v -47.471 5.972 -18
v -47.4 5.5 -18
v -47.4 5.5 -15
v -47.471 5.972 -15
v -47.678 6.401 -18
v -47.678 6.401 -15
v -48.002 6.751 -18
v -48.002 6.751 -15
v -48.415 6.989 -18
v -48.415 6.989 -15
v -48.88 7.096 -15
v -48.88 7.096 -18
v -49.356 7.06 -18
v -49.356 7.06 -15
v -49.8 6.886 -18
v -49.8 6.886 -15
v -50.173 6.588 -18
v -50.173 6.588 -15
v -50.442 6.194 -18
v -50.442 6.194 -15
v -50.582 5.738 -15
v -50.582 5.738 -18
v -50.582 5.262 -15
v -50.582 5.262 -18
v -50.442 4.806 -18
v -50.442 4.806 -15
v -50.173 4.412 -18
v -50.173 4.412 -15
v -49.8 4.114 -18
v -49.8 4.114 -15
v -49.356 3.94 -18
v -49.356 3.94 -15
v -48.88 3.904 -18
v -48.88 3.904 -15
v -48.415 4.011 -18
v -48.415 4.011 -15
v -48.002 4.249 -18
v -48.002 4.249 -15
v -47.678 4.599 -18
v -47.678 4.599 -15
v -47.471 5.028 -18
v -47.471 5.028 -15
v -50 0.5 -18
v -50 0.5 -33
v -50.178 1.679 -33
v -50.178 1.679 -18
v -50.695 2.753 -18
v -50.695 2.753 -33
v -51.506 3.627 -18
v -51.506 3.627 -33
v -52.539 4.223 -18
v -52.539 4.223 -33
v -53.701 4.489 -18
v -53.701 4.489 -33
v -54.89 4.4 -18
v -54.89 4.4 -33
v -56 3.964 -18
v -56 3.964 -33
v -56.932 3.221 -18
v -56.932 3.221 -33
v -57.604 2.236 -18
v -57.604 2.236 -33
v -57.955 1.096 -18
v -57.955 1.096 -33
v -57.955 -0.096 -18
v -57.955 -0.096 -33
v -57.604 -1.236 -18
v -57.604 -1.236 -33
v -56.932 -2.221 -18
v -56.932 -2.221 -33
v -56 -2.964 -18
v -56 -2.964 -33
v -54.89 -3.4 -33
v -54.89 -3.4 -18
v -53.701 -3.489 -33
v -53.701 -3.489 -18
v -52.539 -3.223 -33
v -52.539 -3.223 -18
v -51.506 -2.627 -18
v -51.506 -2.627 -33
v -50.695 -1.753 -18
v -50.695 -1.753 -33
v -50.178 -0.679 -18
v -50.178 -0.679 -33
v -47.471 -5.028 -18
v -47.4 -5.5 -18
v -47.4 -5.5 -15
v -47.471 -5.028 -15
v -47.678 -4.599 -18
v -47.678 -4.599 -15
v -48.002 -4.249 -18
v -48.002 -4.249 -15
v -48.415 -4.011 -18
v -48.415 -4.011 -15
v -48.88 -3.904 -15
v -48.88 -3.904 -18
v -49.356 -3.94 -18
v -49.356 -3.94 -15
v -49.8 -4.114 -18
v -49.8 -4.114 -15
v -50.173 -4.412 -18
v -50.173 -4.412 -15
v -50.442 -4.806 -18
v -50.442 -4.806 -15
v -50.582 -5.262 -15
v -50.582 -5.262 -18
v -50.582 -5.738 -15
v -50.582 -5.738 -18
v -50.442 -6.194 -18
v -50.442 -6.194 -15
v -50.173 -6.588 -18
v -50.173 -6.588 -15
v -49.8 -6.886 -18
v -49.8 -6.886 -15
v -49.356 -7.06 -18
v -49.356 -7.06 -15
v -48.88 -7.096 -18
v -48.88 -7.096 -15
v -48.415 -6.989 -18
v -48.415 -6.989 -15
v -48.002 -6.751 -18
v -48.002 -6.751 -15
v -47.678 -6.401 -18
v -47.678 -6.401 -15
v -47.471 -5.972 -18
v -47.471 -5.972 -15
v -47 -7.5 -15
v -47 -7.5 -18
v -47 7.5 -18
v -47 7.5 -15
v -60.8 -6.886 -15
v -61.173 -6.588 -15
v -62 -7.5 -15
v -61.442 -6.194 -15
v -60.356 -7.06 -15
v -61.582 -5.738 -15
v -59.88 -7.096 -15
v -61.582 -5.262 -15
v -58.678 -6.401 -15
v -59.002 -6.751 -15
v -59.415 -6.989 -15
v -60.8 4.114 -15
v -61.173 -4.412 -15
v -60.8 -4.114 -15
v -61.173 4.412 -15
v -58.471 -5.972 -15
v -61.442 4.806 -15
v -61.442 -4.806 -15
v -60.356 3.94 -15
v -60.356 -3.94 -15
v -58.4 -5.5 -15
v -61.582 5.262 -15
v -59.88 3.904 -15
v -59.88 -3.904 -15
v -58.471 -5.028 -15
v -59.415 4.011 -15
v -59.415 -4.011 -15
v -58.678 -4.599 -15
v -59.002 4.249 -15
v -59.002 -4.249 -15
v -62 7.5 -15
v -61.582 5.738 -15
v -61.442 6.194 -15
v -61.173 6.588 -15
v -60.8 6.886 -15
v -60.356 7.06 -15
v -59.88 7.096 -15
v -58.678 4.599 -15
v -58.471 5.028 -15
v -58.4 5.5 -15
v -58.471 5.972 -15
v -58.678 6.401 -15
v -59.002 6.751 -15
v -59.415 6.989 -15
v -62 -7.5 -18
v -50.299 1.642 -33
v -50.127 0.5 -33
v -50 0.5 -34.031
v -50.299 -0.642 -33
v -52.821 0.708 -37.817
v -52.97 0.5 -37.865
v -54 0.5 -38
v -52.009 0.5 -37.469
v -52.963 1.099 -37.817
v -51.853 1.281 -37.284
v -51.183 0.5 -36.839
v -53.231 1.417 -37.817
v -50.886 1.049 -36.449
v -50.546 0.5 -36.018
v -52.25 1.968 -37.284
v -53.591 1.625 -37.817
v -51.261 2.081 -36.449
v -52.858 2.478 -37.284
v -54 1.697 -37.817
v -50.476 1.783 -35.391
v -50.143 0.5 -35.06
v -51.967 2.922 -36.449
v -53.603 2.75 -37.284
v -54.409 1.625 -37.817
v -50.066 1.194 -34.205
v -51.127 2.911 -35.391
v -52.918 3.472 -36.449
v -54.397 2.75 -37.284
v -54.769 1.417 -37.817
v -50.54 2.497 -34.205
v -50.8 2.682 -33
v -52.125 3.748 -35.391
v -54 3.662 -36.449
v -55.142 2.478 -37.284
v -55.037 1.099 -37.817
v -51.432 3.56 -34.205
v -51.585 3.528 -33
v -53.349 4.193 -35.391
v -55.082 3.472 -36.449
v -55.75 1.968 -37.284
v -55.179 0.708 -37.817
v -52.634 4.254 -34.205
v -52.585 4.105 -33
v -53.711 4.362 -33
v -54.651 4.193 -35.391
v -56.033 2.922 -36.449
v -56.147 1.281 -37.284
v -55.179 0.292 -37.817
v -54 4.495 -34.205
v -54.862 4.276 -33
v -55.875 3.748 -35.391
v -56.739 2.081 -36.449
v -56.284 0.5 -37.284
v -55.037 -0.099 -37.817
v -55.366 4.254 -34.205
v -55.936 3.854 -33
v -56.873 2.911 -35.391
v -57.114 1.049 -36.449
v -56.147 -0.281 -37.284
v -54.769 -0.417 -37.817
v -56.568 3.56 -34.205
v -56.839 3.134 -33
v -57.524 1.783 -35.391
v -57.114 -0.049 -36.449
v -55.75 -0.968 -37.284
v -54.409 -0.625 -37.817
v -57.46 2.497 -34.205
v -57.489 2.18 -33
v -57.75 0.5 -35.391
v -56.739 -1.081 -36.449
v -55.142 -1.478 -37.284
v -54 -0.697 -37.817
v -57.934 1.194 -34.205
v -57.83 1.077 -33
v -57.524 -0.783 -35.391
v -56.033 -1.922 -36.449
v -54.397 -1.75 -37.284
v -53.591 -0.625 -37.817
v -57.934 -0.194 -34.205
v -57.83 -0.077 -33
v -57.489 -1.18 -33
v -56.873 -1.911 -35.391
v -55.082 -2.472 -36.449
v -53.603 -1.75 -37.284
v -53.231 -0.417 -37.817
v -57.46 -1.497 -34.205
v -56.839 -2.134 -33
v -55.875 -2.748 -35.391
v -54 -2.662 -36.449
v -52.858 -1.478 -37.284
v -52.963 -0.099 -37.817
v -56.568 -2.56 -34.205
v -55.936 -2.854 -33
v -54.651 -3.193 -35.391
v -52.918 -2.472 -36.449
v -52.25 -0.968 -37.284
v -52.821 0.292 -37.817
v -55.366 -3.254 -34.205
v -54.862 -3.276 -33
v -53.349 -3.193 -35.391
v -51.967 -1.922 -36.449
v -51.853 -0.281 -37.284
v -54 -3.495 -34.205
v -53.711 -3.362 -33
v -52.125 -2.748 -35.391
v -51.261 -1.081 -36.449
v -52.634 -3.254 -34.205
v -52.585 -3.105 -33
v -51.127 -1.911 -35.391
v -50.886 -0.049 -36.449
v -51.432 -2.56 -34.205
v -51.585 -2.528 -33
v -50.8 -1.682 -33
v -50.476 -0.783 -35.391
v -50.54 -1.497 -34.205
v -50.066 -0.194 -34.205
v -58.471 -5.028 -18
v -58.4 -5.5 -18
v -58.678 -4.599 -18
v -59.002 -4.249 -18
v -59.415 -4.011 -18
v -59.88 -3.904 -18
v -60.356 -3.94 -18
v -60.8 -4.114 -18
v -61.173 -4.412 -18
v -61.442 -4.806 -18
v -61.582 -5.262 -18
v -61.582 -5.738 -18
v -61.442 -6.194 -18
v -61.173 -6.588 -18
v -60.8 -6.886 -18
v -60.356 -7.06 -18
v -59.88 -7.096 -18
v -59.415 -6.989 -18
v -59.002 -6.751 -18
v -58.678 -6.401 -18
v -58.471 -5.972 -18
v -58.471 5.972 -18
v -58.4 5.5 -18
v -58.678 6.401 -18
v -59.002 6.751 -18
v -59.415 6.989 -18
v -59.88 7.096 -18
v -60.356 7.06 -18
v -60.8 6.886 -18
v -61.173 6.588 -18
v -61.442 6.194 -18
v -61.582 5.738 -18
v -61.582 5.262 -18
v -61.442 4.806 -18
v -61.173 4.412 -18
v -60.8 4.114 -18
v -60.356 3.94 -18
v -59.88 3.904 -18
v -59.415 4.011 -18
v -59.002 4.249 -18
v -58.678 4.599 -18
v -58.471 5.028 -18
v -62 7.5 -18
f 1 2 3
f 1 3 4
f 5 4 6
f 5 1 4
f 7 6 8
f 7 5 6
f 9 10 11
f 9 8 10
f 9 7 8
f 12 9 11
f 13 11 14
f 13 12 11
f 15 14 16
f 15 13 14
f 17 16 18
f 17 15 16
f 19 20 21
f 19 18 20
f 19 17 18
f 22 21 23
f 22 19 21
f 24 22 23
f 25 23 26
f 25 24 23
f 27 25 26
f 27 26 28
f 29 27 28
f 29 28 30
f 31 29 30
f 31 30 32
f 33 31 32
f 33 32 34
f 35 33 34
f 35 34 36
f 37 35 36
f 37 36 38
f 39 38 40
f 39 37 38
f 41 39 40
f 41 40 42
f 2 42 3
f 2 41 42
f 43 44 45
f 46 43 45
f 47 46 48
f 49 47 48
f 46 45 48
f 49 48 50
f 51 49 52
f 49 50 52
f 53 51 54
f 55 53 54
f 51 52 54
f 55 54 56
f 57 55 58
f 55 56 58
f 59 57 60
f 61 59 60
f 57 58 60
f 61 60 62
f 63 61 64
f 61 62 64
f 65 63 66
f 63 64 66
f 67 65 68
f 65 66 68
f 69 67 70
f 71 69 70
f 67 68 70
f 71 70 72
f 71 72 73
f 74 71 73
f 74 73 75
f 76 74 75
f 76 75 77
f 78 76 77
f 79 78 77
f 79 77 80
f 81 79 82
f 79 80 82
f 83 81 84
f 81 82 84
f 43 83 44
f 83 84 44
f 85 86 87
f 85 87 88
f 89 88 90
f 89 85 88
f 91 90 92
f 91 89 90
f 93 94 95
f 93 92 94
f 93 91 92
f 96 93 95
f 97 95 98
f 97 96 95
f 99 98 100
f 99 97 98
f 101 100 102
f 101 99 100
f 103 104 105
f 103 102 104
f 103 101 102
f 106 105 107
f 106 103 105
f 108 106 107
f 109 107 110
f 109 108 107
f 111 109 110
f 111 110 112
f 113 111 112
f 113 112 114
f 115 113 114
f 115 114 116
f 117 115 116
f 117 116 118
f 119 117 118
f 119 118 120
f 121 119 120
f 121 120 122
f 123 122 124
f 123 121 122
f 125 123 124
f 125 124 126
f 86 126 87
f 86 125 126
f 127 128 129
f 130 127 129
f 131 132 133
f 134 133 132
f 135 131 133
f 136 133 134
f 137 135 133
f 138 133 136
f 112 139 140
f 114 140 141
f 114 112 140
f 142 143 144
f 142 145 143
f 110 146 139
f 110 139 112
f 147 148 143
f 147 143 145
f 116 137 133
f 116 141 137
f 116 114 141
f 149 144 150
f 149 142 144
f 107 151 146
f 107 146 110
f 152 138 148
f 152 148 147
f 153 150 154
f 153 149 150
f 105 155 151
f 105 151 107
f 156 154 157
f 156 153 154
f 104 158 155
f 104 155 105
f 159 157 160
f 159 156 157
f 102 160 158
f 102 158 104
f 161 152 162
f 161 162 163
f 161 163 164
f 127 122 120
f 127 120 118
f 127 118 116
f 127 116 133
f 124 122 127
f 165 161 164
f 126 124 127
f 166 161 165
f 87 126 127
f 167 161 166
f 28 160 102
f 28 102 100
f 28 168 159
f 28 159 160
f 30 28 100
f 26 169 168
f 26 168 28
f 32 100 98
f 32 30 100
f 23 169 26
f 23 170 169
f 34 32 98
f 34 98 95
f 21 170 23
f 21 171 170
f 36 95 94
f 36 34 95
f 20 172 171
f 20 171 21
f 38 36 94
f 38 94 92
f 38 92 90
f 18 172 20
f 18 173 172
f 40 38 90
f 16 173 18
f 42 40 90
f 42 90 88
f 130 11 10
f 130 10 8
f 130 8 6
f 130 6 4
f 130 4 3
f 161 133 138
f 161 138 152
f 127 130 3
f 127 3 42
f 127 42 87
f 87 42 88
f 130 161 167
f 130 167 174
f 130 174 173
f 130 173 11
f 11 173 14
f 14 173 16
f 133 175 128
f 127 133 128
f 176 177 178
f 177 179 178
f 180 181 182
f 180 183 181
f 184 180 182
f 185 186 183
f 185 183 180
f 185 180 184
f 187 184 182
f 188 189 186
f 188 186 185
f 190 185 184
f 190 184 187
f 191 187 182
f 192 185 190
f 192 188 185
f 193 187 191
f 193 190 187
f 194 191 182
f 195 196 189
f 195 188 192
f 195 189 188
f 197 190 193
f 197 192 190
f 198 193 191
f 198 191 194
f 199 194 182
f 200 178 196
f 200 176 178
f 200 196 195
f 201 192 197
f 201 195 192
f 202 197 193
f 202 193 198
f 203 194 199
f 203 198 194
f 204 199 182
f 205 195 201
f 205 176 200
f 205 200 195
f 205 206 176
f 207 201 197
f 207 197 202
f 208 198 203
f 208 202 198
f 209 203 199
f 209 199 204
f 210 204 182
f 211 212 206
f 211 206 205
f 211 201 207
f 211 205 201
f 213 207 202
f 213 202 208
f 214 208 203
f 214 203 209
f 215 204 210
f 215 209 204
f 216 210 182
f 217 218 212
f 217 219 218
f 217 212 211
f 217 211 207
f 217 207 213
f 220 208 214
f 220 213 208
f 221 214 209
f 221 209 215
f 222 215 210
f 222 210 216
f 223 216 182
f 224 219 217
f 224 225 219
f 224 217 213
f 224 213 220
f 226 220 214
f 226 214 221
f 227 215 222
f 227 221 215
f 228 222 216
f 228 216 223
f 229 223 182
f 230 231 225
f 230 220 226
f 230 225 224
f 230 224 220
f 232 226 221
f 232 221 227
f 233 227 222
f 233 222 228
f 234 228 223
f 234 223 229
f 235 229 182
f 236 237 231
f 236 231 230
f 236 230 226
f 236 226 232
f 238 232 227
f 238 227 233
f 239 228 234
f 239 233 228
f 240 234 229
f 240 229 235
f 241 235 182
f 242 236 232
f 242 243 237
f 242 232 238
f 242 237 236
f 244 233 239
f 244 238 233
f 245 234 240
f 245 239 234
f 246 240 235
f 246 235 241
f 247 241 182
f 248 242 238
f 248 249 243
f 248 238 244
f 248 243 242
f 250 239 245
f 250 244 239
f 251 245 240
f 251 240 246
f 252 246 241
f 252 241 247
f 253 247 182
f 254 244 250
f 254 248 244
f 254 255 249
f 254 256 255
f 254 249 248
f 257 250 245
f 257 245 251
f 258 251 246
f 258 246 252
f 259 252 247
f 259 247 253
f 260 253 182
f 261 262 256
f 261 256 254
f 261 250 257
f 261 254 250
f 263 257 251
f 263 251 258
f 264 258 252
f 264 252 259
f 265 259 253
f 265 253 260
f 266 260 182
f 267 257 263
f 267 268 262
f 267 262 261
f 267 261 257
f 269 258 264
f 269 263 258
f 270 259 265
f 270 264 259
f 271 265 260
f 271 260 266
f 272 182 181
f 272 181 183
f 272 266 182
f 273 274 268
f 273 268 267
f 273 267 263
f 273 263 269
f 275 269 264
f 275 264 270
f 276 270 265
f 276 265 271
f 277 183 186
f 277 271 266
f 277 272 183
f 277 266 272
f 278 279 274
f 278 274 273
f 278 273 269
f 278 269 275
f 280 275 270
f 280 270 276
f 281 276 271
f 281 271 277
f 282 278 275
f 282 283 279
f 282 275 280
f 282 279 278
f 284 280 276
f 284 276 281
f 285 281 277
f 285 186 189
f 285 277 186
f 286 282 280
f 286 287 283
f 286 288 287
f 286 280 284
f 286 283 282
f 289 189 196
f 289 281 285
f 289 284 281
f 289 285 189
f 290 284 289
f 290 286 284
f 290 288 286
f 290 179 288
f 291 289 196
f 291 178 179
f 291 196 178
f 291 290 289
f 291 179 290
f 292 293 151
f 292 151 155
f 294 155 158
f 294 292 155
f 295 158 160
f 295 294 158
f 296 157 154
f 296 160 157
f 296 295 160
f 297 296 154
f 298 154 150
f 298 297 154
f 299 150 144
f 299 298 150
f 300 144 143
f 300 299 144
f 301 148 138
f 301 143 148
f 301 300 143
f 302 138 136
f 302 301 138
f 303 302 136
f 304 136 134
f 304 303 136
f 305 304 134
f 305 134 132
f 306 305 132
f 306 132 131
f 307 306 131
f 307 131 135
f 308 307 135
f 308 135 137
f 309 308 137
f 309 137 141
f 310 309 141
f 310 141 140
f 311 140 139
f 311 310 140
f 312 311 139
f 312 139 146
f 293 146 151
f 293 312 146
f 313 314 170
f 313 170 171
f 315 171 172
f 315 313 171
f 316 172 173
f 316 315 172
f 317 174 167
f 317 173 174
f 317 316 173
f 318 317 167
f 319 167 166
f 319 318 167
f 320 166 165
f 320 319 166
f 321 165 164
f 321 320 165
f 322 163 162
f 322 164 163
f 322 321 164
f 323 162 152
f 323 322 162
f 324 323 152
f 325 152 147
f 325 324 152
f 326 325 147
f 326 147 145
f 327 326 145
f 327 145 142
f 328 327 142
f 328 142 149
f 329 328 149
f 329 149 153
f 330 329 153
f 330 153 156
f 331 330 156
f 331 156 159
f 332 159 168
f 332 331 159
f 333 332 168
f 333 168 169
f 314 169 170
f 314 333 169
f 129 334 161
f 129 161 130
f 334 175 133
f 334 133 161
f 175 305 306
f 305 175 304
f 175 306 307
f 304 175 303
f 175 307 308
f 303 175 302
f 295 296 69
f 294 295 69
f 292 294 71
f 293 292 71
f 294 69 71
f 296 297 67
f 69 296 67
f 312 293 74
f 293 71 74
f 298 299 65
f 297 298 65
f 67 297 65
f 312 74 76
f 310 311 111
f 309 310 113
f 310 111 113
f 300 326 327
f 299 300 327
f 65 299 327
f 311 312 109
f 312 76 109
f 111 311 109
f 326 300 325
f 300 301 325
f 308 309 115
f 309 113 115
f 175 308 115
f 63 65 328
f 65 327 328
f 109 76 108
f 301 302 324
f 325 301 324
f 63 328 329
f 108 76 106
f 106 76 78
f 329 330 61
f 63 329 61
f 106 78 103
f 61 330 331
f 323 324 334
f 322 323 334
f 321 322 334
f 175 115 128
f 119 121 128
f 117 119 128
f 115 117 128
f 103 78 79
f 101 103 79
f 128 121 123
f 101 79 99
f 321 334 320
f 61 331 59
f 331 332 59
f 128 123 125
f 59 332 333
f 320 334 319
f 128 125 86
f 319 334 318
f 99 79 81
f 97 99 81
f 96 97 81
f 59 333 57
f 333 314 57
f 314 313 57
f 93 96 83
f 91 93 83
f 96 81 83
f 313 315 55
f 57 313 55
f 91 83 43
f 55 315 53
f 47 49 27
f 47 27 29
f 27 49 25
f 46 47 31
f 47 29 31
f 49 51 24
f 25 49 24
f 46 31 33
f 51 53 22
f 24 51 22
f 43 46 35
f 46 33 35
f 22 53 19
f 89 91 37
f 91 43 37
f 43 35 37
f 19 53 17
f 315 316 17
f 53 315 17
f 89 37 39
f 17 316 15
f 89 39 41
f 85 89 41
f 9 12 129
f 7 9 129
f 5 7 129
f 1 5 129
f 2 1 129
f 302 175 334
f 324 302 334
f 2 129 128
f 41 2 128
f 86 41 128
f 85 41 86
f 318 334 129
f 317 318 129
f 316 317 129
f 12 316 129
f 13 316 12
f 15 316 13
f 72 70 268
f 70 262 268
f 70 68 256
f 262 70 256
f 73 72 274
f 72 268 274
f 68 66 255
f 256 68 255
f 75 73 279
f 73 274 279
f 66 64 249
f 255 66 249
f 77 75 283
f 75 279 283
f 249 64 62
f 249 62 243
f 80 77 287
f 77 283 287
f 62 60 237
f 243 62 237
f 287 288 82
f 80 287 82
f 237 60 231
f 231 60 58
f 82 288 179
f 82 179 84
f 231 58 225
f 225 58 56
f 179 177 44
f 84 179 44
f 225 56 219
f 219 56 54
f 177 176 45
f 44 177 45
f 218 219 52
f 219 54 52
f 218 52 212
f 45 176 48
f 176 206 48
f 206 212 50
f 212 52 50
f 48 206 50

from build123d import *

# Parameters (mm, degrees)
CYLINDER115_R     = 1.6
CYLINDER115_DEPTH = 10
CYLINDER116_R     = 1.6
CYLINDER116_DEPTH = 10
CYLINDER117_R     = 1.6
CYLINDER117_DEPTH = 10
CYLINDER114_R     = 1.6
CYLINDER114_DEPTH = 10
BOX029_W          = 15
BOX029_H          = 15
BOX029_DEPTH      = 3
CYLINDER113_R     = 4
CYLINDER113_DEPTH = 15


with BuildPart() as cilindro115:
    # Cylinder115 → Cylinder115 (new body)
    with BuildSketch(Plane(origin=(32, 5, -20), x_dir=(1, 0, 0), z_dir=(0, 0, 1))):
        Circle(CYLINDER115_R)
    extrude(amount=CYLINDER115_DEPTH)


with BuildPart() as cilindro116:
    # Cylinder116 → Cylinder116 (new body)
    with BuildSketch(Plane(origin=(21, -6, -20), x_dir=(1, 0, 0), z_dir=(0, 0, 1))):
        Circle(CYLINDER116_R)
    extrude(amount=CYLINDER116_DEPTH)


with BuildPart() as cilindro117:
    # Cylinder117 → Cylinder117 (new body)
    with BuildSketch(Plane(origin=(21, 5, -20), x_dir=(1, 0, 0), z_dir=(0, 0, 1))):
        Circle(CYLINDER117_R)
    extrude(amount=CYLINDER117_DEPTH)


with BuildPart() as fusion058:
    # Cylinder114 → Cylinder114 (new body)
    with BuildSketch(Plane(origin=(32, -6, -20), x_dir=(1, 0, 0), z_dir=(0, 0, 1))):
        Circle(CYLINDER114_R)
    extrude(amount=CYLINDER114_DEPTH)

    # Fusion058: union Cilindro115, Cilindro116, Cilindro117
    add(cilindro115.part)
    add(cilindro116.part)
    add(cilindro117.part)


with BuildPart() as cubo028:
    # Box029 → Box029 (new body)
    with BuildSketch(Plane(origin=(-8, -8, 4), x_dir=(1, 0, 0), z_dir=(0, 0, 1))):
        with Locations((7.5, 7.5)):
            Rectangle(BOX029_W, BOX029_H)
    extrude(amount=BOX029_DEPTH)


with BuildPart() as esfera001:
    # Sphere001 → Sphere001 (revolve)
    with BuildSketch(Plane(origin=(0, 0, -16), x_dir=(1, 0, 0), z_dir=(0, -1, 0))):
        with BuildLine():
            ThreePointArc((0, -4), (4, 0), (0, 4))
            Line((0, 4), (0, -4))
        make_face()
    revolve(axis=Axis((0, 0, -16), (0, 0, 1)))


with BuildPart() as ballcastera001:
    # Cylinder113 → Cylinder113 (new body)
    with BuildSketch(Plane.XY.offset(-15)):
        Circle(CYLINDER113_R)
    extrude(amount=CYLINDER113_DEPTH)

    # Fusion059: union Esfera001
    add(esfera001.part)


with BuildPart() as ballcastera001_1:
    # Fusion059 placement: moved
    add(ballcastera001.part.moved(Location((0, 0, 4))))

    # Fusion060: union Cubo028
    add(cubo028.part)


with BuildPart() as ballcastera001_2:
    # Fusion060 placement: moved
    add(ballcastera001_1.part.moved(Location((27, 0, -22))))

    # Cut019: cut Fusion058
    add(fusion058.part, mode=Mode.SUBTRACT)


with BuildPart() as ballcastera001_3:
    # Cut019 placement: moved
    add(ballcastera001_2.part.moved(Location((-81, 0.5, 0))))


solid = ballcastera001_3.part
